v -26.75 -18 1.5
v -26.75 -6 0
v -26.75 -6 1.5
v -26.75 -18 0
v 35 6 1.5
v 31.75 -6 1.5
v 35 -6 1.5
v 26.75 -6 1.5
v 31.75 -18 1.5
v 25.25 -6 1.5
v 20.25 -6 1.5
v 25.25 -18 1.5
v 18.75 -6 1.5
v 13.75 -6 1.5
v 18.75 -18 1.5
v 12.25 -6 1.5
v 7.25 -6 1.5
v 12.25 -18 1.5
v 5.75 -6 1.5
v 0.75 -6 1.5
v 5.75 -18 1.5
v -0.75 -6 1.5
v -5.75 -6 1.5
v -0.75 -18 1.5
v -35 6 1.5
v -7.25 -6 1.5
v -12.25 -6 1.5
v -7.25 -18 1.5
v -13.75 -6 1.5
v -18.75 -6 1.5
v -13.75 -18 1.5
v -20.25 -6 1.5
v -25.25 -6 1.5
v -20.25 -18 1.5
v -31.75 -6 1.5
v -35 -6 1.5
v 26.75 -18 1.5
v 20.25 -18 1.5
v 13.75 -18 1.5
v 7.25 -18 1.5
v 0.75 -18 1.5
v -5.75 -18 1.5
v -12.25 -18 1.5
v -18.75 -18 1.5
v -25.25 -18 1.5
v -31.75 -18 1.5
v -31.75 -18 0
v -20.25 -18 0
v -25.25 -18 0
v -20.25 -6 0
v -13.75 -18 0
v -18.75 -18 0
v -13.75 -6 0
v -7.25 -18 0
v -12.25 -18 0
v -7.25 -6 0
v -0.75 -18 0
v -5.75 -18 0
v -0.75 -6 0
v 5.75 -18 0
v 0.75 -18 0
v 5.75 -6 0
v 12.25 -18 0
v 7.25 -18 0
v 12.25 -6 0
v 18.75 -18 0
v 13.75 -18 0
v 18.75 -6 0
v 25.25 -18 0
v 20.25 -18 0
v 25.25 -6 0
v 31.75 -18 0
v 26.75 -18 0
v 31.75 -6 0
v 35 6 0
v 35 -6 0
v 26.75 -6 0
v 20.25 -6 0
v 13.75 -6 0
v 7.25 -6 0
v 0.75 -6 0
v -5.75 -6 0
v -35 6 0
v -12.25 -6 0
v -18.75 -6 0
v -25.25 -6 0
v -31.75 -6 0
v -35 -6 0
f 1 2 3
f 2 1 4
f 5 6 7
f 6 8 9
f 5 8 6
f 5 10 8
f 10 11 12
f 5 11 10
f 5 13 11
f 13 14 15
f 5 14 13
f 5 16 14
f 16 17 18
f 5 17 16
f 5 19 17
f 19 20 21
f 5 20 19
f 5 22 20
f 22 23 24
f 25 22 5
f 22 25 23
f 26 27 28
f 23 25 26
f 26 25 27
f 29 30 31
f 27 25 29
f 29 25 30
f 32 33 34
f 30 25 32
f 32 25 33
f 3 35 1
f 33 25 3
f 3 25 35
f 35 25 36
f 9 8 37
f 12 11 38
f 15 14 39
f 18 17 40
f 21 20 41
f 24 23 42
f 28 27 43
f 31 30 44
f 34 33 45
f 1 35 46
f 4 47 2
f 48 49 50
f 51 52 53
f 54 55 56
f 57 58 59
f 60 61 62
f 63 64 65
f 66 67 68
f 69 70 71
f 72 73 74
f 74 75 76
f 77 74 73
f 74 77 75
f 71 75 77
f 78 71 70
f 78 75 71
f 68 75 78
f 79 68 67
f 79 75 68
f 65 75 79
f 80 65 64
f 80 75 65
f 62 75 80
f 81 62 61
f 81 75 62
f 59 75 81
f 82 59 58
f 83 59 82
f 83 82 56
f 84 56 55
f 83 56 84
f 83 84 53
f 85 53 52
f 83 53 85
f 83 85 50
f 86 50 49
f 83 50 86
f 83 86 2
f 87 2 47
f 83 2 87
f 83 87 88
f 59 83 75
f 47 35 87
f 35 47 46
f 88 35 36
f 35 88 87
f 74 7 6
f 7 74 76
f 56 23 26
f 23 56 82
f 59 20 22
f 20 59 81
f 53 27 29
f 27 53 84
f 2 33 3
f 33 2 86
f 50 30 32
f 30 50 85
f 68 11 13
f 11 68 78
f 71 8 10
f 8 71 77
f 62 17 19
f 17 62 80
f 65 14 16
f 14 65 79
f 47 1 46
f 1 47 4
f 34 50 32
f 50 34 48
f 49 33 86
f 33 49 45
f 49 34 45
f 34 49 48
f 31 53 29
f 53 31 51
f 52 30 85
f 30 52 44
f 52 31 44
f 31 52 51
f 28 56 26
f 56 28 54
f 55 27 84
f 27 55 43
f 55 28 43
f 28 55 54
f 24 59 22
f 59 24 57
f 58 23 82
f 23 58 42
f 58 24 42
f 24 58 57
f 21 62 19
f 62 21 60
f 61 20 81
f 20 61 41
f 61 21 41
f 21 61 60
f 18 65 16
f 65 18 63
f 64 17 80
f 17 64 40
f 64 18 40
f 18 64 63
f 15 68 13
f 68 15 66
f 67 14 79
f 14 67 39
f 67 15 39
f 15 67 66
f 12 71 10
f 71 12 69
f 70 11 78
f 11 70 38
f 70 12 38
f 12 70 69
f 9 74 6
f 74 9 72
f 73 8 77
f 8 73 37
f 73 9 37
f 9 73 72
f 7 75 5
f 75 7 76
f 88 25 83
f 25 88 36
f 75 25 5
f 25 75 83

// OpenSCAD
$fn = 64;

// Dimensions (mm)
spine_length     = 70;          // X
spine_width      = 12;           // Y
spine_thickness  = 1.5;          // Z

tooth_width      = 5;            // X
tooth_length     = 12;           // Y
tooth_thickness  = 1.5;          // Z

num_teeth        = 10;
gap_between_teeth = 1.5;         // Y

// Derived dimensions
total_teeth_width = num_teeth * tooth_width + (num_teeth - 1) * gap_between_teeth; // 63.5
start_x            = -total_teeth_width / 2; // -31.75

// Build comb
union() {
    // Spine
    translate([ -spine_length/2, -spine_width/2, 0 ])
        cube([ spine_length, spine_width, spine_thickness ], center=false);

    // Teeth
    for(i=[0:num_teeth-1]) {
        translate([ start_x + i*(tooth_width + gap_between_teeth), -spine_width/2 - tooth_length, 0 ])
            cube([ tooth_width, tooth_length, tooth_thickness ], center=false);
    }
}
